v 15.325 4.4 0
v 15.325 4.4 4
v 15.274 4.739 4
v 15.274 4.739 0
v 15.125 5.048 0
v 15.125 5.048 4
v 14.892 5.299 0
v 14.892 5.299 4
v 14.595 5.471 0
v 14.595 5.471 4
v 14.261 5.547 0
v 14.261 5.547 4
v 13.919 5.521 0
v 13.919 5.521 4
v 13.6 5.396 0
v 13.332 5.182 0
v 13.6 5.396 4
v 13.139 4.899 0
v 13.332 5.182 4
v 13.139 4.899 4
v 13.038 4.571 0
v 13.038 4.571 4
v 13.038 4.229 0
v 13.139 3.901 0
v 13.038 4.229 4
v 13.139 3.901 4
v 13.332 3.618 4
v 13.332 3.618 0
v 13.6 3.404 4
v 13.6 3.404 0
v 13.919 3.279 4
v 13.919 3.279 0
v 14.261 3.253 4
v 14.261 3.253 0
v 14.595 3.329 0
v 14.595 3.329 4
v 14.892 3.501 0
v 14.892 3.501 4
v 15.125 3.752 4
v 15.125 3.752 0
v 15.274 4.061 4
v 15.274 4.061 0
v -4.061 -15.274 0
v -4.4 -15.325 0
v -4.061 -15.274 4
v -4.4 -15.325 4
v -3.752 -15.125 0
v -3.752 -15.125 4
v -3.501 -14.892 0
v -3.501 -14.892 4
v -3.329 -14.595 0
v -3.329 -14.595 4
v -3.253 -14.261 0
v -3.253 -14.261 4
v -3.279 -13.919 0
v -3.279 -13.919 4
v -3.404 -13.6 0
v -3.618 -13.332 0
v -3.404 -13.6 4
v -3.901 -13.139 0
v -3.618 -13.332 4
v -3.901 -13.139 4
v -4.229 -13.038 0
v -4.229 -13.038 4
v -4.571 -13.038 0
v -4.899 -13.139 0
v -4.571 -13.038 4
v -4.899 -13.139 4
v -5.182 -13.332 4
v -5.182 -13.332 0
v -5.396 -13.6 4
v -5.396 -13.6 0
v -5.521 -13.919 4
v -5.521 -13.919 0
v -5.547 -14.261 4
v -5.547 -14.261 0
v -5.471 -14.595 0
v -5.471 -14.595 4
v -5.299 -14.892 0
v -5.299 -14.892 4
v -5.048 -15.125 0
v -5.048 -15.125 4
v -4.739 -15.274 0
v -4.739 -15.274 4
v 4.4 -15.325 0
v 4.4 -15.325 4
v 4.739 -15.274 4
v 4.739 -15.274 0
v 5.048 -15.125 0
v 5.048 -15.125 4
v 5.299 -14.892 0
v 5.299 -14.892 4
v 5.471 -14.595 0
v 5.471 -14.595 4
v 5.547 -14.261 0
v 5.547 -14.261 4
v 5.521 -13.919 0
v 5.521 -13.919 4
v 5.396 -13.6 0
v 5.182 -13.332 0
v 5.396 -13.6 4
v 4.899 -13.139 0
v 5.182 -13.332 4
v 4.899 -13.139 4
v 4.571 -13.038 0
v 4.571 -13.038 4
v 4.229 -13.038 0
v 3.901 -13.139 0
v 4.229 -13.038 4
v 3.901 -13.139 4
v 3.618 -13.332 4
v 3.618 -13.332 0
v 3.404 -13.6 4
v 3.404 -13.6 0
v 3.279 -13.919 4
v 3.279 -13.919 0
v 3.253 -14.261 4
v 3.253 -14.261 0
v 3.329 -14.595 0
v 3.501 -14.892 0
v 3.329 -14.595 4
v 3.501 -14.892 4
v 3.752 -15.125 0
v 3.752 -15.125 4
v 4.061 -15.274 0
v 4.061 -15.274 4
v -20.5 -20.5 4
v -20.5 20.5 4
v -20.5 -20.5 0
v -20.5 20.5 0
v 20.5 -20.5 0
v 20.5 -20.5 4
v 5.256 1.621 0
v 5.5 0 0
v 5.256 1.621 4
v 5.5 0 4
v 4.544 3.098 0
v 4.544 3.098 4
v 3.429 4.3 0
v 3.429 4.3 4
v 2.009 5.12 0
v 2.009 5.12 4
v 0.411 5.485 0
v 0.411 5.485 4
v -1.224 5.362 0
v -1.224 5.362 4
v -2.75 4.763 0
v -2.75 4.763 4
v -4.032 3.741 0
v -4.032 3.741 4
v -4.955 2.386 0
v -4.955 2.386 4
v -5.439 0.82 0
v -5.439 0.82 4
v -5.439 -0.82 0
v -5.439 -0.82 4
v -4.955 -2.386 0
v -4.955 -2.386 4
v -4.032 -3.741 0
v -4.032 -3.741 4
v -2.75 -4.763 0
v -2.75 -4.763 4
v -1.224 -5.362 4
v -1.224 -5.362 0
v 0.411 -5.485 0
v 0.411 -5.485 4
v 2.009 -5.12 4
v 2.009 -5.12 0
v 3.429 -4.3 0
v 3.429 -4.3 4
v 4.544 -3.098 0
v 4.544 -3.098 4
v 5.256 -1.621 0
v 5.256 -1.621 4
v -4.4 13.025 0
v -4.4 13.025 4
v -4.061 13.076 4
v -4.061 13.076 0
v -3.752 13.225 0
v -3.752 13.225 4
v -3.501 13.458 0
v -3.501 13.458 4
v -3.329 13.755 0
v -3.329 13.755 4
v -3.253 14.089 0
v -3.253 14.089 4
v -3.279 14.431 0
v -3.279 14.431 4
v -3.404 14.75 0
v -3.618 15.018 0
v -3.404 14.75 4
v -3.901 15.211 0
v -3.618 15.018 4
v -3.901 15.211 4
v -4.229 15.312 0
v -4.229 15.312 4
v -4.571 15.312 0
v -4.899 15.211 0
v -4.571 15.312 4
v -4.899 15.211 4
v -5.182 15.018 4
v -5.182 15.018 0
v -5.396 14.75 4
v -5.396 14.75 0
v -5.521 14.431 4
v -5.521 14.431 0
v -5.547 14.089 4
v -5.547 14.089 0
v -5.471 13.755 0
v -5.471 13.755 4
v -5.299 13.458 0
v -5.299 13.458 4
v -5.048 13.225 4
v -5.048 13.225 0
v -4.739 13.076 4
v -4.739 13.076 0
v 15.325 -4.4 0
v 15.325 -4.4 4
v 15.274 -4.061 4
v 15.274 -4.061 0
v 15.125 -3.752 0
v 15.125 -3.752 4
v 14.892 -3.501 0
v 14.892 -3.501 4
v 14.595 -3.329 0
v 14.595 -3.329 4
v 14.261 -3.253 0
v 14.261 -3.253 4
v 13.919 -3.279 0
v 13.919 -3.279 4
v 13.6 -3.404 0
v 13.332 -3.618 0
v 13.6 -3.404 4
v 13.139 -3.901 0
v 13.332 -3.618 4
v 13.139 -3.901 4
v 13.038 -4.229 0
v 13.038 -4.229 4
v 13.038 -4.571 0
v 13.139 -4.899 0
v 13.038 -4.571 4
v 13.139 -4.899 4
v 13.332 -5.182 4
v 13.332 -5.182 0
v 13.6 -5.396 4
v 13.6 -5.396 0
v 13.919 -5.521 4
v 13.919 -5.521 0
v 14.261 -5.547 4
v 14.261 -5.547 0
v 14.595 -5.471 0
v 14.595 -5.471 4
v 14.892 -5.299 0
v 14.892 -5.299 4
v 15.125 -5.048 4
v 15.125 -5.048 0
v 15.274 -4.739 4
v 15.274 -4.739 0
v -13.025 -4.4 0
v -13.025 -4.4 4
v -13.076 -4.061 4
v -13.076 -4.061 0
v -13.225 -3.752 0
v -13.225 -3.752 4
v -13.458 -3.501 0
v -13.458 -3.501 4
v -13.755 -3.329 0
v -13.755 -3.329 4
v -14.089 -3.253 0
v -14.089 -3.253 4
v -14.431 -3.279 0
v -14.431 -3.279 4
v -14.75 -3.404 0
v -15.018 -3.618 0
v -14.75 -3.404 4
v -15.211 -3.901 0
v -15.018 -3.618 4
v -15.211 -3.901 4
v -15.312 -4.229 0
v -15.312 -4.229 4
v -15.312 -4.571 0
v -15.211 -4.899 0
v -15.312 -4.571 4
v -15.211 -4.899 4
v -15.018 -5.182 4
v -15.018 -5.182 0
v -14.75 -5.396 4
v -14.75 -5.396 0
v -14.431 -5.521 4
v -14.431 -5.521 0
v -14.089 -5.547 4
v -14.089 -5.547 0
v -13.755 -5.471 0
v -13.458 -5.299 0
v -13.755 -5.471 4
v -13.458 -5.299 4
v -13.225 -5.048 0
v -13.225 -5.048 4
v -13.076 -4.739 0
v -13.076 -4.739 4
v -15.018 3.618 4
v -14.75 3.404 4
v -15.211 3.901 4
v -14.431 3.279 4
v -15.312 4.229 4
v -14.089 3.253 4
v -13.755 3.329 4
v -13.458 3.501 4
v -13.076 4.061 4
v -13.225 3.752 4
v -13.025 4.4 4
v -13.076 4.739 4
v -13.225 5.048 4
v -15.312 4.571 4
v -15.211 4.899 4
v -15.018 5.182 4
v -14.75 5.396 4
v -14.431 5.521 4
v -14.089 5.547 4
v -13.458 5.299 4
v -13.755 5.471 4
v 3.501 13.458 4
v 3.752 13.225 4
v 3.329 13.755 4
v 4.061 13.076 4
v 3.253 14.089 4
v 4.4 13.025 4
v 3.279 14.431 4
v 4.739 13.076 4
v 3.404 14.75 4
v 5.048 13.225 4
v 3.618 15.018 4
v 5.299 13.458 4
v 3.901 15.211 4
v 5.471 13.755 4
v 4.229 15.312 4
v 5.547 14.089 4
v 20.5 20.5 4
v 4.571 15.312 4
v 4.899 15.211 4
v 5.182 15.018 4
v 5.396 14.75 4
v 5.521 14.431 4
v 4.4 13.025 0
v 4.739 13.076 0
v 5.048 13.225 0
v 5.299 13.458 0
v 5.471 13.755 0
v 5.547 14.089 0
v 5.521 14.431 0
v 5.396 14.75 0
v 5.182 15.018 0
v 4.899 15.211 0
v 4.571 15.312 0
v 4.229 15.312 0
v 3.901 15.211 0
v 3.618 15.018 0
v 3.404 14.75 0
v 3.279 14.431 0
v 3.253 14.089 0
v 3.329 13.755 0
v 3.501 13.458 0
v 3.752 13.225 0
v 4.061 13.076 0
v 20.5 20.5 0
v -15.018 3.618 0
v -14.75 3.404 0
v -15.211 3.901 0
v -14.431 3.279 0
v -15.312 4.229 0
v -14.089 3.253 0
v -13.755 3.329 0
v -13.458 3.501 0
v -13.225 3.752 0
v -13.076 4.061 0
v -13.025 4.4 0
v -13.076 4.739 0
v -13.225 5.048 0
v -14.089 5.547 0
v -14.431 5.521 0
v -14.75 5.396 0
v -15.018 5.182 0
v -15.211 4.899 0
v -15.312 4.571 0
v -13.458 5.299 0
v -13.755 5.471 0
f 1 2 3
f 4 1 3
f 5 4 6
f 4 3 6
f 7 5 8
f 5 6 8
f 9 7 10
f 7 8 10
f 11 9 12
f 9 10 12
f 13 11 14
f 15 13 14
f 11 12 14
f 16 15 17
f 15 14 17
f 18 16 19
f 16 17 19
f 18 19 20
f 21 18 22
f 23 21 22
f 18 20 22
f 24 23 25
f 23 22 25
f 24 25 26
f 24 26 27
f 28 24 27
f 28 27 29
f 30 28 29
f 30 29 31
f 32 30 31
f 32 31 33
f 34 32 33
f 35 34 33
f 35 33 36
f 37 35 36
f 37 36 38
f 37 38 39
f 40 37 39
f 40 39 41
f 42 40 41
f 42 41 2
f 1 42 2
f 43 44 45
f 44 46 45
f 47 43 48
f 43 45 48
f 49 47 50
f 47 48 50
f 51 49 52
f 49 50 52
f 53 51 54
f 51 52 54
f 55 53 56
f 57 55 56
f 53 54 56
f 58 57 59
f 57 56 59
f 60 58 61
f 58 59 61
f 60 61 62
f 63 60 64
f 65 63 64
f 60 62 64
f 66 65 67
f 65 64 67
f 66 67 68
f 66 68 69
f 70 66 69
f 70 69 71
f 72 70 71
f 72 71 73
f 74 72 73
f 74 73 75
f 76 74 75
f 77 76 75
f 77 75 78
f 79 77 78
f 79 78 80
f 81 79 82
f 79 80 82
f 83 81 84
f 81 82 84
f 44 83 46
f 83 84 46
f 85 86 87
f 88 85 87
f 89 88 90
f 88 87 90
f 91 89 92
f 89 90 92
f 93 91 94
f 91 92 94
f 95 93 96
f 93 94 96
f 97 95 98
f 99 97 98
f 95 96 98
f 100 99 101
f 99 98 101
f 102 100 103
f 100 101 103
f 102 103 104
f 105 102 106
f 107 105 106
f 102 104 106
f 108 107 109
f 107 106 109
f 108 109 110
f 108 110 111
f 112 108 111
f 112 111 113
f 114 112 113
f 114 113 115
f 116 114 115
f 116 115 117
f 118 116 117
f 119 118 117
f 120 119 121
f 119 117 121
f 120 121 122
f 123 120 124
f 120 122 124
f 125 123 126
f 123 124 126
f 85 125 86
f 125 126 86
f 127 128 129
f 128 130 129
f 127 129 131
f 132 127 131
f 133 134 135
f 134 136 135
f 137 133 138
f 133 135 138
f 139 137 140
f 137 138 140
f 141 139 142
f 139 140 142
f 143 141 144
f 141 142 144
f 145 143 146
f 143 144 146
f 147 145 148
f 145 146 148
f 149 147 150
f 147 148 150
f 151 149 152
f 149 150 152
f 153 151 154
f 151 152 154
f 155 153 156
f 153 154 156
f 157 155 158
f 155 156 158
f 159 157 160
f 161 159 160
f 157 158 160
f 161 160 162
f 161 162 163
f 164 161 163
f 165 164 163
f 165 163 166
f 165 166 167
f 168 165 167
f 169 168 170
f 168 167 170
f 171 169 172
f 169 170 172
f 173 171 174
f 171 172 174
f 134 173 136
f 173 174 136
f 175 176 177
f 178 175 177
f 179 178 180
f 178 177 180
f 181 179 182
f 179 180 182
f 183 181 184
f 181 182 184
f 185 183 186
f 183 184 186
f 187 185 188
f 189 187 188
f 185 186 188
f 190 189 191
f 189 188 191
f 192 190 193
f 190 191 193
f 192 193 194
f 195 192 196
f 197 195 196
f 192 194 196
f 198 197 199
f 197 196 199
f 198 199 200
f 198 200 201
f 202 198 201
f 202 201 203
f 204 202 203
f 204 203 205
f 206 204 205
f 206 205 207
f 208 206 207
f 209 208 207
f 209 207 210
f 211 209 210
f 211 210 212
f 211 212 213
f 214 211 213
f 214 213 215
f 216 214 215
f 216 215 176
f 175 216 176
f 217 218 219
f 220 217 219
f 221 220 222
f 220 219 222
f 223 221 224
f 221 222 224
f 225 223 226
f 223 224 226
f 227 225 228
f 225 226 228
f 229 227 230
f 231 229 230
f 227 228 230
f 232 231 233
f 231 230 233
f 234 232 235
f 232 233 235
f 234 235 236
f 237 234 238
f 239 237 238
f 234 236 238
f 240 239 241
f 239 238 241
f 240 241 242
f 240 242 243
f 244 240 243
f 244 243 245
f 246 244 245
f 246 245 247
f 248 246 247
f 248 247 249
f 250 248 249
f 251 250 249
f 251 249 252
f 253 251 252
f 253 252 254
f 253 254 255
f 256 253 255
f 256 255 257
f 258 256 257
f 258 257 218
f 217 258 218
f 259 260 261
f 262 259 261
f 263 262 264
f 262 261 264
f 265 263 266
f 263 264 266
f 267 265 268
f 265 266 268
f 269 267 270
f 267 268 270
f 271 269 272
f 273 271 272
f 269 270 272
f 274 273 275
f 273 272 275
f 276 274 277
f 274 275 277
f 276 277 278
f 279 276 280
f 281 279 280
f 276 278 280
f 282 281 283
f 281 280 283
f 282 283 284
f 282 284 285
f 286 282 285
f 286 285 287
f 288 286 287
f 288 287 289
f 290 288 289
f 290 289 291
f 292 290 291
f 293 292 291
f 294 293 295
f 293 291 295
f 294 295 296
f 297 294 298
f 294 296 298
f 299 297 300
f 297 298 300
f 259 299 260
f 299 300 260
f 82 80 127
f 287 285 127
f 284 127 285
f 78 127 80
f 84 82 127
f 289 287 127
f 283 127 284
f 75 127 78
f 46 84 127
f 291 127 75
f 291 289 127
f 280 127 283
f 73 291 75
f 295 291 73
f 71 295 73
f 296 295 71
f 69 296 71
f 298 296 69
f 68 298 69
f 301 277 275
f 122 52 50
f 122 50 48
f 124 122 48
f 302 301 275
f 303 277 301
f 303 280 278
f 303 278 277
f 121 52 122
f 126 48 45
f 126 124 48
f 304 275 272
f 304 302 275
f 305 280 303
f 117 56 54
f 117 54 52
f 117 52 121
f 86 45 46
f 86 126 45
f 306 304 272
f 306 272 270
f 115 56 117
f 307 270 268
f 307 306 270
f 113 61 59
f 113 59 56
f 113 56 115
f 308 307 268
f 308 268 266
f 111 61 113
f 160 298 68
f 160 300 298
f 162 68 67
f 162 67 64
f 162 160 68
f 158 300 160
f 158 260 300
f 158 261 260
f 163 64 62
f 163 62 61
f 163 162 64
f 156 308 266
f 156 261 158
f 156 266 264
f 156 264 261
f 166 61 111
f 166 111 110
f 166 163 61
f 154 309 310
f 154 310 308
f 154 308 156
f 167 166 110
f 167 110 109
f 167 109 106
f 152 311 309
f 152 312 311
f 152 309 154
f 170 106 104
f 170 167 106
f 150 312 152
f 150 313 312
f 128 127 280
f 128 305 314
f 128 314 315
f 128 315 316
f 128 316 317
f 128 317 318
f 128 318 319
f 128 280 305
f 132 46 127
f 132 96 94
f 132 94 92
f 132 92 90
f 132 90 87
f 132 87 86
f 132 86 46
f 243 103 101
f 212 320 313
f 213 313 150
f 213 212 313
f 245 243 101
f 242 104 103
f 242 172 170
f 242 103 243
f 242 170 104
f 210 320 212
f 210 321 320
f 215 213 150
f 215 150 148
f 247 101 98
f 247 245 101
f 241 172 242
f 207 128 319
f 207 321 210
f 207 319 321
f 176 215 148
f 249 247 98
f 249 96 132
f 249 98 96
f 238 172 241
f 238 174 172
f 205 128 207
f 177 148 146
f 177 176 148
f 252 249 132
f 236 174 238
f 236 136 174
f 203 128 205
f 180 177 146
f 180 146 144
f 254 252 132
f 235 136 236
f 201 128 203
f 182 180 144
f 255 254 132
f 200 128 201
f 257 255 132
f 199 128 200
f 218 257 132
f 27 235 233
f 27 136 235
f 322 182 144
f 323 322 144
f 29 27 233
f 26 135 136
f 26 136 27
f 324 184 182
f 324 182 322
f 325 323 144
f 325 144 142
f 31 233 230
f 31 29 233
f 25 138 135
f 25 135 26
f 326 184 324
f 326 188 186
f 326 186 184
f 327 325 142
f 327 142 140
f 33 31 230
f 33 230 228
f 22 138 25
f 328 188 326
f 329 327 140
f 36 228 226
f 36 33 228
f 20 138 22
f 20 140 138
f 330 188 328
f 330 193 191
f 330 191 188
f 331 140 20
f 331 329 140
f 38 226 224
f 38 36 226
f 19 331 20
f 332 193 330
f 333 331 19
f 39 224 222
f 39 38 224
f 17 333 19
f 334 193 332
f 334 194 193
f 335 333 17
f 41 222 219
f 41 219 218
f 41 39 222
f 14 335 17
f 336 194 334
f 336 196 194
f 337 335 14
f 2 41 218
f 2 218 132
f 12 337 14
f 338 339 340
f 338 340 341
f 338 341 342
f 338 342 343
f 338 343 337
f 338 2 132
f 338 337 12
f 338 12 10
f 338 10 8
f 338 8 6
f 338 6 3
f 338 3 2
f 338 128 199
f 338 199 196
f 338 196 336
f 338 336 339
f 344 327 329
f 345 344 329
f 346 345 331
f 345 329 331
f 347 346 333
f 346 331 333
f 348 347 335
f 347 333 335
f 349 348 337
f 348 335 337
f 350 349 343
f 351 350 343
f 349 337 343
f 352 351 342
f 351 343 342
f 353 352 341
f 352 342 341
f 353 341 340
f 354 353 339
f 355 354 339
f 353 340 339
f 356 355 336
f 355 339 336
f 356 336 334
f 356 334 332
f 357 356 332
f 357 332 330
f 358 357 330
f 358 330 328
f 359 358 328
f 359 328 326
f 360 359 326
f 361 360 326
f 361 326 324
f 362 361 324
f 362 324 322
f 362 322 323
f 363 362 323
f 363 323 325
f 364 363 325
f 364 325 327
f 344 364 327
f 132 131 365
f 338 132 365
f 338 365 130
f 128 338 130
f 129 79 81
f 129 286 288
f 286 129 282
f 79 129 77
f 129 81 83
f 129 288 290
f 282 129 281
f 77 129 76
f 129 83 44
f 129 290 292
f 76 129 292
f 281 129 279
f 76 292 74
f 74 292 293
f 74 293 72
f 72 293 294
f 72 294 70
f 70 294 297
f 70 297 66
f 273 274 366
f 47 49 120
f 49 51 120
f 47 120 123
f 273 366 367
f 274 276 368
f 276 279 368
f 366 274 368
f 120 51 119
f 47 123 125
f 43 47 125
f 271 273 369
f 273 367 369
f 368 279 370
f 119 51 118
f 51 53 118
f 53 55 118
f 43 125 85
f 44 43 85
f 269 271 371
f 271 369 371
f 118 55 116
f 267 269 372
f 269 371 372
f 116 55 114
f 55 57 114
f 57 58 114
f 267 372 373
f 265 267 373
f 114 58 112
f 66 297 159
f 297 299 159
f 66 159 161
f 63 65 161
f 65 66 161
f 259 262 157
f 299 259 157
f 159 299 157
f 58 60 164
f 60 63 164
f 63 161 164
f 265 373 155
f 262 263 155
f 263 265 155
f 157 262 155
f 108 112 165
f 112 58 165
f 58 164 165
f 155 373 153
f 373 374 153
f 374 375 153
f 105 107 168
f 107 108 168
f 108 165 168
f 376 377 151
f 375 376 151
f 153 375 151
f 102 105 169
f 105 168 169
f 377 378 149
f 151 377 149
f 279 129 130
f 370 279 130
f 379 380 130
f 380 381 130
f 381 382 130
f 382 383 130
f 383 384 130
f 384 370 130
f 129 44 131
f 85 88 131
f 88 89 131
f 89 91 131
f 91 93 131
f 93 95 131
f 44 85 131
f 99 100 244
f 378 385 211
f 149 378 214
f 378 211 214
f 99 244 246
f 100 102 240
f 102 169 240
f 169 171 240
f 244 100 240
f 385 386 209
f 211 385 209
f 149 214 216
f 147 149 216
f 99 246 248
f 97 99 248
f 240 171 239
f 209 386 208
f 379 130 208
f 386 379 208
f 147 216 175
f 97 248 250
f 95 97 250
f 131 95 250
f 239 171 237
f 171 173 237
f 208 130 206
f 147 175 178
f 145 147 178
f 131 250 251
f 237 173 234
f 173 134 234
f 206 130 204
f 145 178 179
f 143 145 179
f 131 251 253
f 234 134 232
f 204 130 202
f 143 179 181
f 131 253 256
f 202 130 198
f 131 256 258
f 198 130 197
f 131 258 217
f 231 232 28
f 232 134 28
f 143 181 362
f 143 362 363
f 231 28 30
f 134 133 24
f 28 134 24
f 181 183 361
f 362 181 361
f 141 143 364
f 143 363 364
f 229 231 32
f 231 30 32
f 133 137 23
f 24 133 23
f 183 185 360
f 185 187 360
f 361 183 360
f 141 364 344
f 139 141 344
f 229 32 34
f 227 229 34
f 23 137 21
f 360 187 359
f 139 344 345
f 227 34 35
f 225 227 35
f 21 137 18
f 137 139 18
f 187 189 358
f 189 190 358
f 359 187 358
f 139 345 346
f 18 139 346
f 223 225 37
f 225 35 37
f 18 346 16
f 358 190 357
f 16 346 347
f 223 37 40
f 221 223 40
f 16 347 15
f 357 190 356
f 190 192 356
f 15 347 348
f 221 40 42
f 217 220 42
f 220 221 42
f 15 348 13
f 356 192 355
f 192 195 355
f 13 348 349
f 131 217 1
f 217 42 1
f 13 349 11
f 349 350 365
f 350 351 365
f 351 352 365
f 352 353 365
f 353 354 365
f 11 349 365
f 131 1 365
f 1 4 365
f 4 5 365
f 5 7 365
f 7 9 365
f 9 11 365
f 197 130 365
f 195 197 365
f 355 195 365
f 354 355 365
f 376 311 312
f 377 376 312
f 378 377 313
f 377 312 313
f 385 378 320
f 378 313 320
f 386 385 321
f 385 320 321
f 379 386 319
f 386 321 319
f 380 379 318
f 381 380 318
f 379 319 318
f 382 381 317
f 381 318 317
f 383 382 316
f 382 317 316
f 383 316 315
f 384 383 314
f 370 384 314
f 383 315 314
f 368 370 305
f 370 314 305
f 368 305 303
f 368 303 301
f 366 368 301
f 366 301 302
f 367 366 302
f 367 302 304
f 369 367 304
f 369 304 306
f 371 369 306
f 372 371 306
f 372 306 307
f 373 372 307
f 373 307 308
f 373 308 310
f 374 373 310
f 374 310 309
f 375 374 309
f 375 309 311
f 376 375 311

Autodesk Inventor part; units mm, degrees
ref_plane "YZ Plane" through (0, 0, 0) normal (1, 0, 0) x (0, 1, 0)
ref_plane "XZ Plane" through (0, 0, 0) normal (0, 1, 0) x (-1, 0, 0)
ref_plane "XY Plane" through (0, 0, 0) normal (0, 0, 1) x (1, 0, 0)
sketch "Sketch1" plane through (0, 0, 0) normal (0, 0, 1) x (1, 0, 0)
  line L0 (-20.5, -20.5) -> (20.5, -20.5)
  line L1 (20.5, -20.5) -> (20.5, 20.5)
  line L2 (20.5, 20.5) -> (-20.5, 20.5)
  line L3 (-20.5, 20.5) -> (-20.5, -20.5)
  line L4 (-20.5, -20.5) -> (20.5, 20.5) construction
  line L5 (20.5, -20.5) -> (-20.5, 20.5) construction
  point P0 (0, 0)
  dimension "d0" = 41
  dimension "d1" = 41
extrude "Extrusion1" add sketch "Sketch1" along normal blind 4
sketch "Sketch2" plane through (0, 0, 4) normal (0, 0, 1) x (1, 0, 0)
  circle A0 centre (0, 0) radius 5.5
  dimension "d4" = 11
extrude "Extrusion2" cut sketch "Sketch2" against normal blind 4
sketch "Sketch3" plane through (0, 0, 4) normal (0, 0, 1) x (1, 0, 0)
  circle A0 centre (0, 0) radius 5.5 projected
  circle A1 centre (0, 0) radius 6.45
  circle A2 centre (-18.375, 0) radius 2.125
  circle A3 centre (18.375, 0) radius 2.125
  line L0 (-18.721, 2.0966) -> (-4.7075, 4.4093)
  line L1 (-18.7594, -2.0899) -> (-4.3799, -4.7348)
  line L2 (18.7217, 2.0965) -> (4.702, 4.4152)
  line L3 (18.7594, -2.0899) -> (4.3799, -4.7348)
  line L4 (0, 0) -> (18.375, 0)
  line L5 (0, 0) -> (-18.375, 0)
  circle A4 centre (-14.175, -4.4) radius 1.15
  circle A5 centre (14.175, 4.4) radius 1.15
  dimension "d7" = 12.9
  dimension "d8" = 4.25
  dimension "d9" = 4.25
  dimension "d10" = 9.15
  dimension "d11" = 9.15
  dimension "d12" = 41
  dimension "d13" = 18.375
  dimension "d14" = 2.3
  dimension "d15" = 4.4
  dimension "d16" = 4.2
  dimension "d17" = 2.3
  dimension "d18" = 4.4
  dimension "d19" = 4.2
extrude "Extrusion3" cut sketch "Sketch3" against normal blind 4 contours A4 | A5
mirror "Mirror1" about plane through (0, 0, 0) normal (0, 1, 0) of "Extrusion3"
pattern_circular "Circular Pattern1" count 4 over 360 about axis through (0, 0, 4) along (0, 0, -1) of "Extrusion3", "Mirror1"
properties part number "servo_attachment"
